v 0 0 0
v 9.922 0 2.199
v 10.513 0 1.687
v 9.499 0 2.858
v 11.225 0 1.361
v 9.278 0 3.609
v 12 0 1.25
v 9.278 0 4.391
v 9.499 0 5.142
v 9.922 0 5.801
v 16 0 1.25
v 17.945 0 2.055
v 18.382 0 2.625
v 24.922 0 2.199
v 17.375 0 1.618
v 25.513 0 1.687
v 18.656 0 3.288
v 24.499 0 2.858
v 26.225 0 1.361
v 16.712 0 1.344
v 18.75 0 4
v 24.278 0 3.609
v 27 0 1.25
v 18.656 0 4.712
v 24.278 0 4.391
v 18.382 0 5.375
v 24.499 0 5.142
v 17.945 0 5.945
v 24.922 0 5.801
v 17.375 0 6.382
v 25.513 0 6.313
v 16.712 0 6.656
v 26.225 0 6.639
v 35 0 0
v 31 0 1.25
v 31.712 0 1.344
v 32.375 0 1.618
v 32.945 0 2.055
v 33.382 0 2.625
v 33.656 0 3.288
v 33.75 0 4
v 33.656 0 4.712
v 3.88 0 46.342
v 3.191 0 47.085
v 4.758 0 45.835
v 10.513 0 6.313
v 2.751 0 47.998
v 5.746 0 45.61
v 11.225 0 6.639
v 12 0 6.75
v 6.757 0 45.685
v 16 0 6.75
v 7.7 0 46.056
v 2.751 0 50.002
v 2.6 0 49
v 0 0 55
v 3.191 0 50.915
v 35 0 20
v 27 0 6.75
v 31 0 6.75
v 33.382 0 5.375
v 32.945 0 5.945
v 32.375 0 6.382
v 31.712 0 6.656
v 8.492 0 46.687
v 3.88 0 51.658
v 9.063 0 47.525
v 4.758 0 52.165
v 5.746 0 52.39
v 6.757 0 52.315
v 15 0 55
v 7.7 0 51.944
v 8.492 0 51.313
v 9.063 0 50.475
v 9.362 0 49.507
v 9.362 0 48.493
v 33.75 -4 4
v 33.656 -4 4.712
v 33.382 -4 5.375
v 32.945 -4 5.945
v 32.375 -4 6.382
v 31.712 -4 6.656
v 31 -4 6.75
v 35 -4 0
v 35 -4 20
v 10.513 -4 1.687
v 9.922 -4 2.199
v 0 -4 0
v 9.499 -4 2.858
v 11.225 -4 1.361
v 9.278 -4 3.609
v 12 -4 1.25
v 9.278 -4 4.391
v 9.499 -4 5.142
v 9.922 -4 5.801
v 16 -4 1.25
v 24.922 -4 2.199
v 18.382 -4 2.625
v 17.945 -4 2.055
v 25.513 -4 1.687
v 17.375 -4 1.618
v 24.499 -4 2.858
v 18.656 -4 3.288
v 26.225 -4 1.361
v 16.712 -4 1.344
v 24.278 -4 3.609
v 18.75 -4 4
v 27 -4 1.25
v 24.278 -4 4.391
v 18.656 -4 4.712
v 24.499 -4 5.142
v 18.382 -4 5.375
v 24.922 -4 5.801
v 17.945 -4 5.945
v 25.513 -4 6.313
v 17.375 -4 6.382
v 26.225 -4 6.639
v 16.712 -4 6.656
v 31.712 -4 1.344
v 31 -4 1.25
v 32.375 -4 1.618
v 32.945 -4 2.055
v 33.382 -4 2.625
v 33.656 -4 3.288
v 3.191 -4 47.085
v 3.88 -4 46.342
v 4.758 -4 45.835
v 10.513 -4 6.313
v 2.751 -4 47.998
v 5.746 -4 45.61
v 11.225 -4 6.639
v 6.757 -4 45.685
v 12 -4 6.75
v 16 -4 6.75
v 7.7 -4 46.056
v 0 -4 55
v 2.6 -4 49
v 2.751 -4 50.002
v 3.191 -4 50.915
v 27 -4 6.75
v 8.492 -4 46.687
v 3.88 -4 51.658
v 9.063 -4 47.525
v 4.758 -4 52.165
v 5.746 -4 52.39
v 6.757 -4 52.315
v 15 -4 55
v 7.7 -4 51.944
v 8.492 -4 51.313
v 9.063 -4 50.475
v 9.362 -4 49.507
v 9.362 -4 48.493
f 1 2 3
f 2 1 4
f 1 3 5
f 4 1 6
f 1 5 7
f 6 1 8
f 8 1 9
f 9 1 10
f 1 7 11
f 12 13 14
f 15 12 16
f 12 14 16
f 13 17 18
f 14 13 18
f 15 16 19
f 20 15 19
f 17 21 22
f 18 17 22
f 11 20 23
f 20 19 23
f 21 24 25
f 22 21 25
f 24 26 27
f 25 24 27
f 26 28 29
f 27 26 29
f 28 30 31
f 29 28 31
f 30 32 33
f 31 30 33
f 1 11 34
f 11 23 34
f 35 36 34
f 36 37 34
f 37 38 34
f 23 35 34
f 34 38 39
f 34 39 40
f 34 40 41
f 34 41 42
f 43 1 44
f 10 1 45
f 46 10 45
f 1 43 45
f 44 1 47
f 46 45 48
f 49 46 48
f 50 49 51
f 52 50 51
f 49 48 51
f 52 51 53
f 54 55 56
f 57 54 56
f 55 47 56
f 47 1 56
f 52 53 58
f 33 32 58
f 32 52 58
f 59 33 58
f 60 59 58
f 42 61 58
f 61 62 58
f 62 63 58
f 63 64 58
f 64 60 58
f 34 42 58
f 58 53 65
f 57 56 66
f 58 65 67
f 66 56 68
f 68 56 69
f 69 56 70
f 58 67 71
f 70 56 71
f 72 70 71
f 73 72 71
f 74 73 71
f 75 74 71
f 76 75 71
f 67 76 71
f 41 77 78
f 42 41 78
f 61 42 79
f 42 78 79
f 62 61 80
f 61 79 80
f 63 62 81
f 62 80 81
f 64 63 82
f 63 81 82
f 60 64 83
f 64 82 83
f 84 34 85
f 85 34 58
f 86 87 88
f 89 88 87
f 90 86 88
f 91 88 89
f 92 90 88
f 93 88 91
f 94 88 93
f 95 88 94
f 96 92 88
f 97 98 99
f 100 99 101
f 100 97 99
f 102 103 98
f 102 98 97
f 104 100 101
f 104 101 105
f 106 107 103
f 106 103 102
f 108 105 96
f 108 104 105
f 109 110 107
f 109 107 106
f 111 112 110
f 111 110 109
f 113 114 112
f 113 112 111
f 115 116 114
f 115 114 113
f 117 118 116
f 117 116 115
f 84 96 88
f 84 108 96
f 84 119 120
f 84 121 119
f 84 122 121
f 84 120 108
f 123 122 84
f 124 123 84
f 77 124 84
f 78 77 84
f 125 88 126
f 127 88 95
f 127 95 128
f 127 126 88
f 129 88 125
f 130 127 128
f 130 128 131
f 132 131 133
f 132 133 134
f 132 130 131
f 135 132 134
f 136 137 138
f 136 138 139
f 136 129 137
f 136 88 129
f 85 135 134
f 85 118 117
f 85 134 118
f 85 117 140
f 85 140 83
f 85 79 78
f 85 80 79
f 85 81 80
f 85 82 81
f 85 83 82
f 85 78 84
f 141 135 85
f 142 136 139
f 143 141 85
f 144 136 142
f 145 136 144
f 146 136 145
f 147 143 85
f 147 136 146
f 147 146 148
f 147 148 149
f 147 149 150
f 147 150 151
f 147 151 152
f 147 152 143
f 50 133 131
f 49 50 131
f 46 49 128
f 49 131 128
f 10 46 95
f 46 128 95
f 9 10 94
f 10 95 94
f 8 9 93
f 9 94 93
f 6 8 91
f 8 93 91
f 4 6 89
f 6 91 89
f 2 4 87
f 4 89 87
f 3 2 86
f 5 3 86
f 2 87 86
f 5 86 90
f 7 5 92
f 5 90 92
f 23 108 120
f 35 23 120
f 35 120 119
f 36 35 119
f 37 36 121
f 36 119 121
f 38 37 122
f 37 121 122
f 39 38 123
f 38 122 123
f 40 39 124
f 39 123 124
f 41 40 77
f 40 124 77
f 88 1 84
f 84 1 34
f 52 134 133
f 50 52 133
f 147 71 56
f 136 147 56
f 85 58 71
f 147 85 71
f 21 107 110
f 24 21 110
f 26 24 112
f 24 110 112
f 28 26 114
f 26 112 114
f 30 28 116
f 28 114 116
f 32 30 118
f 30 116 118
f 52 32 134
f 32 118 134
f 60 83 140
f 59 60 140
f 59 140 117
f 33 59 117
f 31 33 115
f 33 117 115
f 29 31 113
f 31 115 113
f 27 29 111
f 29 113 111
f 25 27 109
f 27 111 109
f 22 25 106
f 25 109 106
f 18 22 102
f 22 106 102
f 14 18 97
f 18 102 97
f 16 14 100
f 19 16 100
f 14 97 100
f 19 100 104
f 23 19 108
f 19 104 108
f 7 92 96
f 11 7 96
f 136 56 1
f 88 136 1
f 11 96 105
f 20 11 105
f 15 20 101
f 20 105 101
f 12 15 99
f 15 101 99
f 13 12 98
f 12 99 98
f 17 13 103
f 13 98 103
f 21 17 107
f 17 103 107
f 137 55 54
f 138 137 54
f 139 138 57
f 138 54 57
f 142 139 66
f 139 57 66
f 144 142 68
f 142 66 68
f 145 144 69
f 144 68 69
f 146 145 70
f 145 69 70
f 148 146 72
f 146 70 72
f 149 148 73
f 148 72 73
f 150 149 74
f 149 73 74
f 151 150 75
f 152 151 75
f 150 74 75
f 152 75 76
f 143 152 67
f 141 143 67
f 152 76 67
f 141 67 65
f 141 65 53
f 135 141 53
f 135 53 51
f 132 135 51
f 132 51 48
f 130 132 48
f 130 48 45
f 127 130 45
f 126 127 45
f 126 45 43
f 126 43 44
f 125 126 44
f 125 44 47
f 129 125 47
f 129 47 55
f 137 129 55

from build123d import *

# Parameters (mm, degrees)
F1_DEPTH = 4
F3_DEPTH = 25
F4_D     = 6.8
F4_DEPTH = 15.35
F4_TIP   = 2.0429261047


with BuildPart() as f1:
    # F0 (on Front) → F1 (new body)
    with BuildSketch(Plane.XZ):
        Polygon((0, 55), (0, 0), (35, 0), (35, 20), (15, 55), align=None)
    extrude(amount=F1_DEPTH)

    # F2 (on face) → F3 (cut)
    with BuildSketch(Plane.XZ.offset(4)):
        with BuildLine():
            ThreePointArc((31, 1.25), (32.9445436483, 2.0554563517), (33.75, 4))
            ThreePointArc((33.75, 4), (32.9445436483, 5.9445436483), (31, 6.75))
            ThreePointArc((31, 6.75), (29.910966294, 6.5251743677), (29, 5.8874586088))
            ThreePointArc((29, 5.8874586088), (29.5556310375, 5.0155048006), (29.75, 4))
            ThreePointArc((29.75, 4), (29.5556310375, 2.9844951994), (29, 2.1125413912))
            ThreePointArc((29, 2.1125413912), (29.910966294, 1.4748256323), (31, 1.25))
        make_face()
        with BuildLine():
            ThreePointArc((29, 5.8874586088), (29.910966294, 6.5251743677), (31, 6.75))
            Line((31, 6.75), (27, 6.75))
            ThreePointArc((27, 6.75), (28.089033706, 6.5251743677), (29, 5.8874586088))
        make_face()
        with BuildLine():
            Line((27, 1.25), (31, 1.25))
            ThreePointArc((31, 1.25), (29.910966294, 1.4748256323), (29, 2.1125413912))
            ThreePointArc((29, 2.1125413912), (28.089033706, 1.4748256323), (27, 1.25))
        make_face()
        with BuildLine():
            ThreePointArc((29, 2.1125413912), (28.25, 4), (29, 5.8874586088))
            ThreePointArc((29, 5.8874586088), (28.089033706, 6.5251743677), (27, 6.75))
            ThreePointArc((27, 6.75), (24.25, 4), (27, 1.25))
            ThreePointArc((27, 1.25), (28.089033706, 1.4748256323), (29, 2.1125413912))
        make_face()
        with BuildLine():
            ThreePointArc((16, 1.25), (17.9445436483, 2.0554563517), (18.75, 4))
            ThreePointArc((18.75, 4), (17.9445436483, 5.9445436483), (16, 6.75))
            ThreePointArc((16, 6.75), (14.910966294, 6.5251743677), (14, 5.8874586088))
            ThreePointArc((14, 5.8874586088), (14.5556310375, 5.0155048006), (14.75, 4))
            ThreePointArc((14.75, 4), (14.5556310375, 2.9844951994), (14, 2.1125413912))
            ThreePointArc((14, 2.1125413912), (14.910966294, 1.4748256323), (16, 1.25))
        make_face()
        with BuildLine():
            ThreePointArc((14, 5.8874586088), (14.910966294, 6.5251743677), (16, 6.75))
            Line((16, 6.75), (12, 6.75))
            ThreePointArc((12, 6.75), (13.089033706, 6.5251743677), (14, 5.8874586088))
        make_face()
        with BuildLine():
            Line((12, 1.25), (16, 1.25))
            ThreePointArc((16, 1.25), (14.910966294, 1.4748256323), (14, 2.1125413912))
            ThreePointArc((14, 2.1125413912), (13.089033706, 1.4748256323), (12, 1.25))
        make_face()
        with BuildLine():
            ThreePointArc((14, 2.1125413912), (13.25, 4), (14, 5.8874586088))
            ThreePointArc((14, 5.8874586088), (13.089033706, 6.5251743677), (12, 6.75))
            ThreePointArc((12, 6.75), (9.25, 4), (12, 1.25))
            ThreePointArc((12, 1.25), (13.089033706, 1.4748256323), (14, 2.1125413912))
        make_face()
        with BuildLine():
            ThreePointArc((14.75, 4), (14.5556310375, 5.0155048006), (14, 5.8874586088))
            ThreePointArc((14, 5.8874586088), (13.25, 4), (14, 2.1125413912))
            ThreePointArc((14, 2.1125413912), (14.5556310375, 2.9844951994), (14.75, 4))
        make_face()
        with BuildLine():
            ThreePointArc((29.75, 4), (29.5556310375, 5.0155048006), (29, 5.8874586088))
            ThreePointArc((29, 5.8874586088), (28.25, 4), (29, 2.1125413912))
            ThreePointArc((29, 2.1125413912), (29.5556310375, 2.9844951994), (29.75, 4))
        make_face()
    extrude(amount=-F3_DEPTH, mode=Mode.SUBTRACT)

    # F4
    with Locations(Plane.XZ.offset(4)):
        with Locations((6, 49)):
            Hole(F4_D / 2, depth=F4_DEPTH)
            with Locations((0, 0, -(F4_DEPTH + F4_TIP / 2))):  # 118° drill point
                Cone(0, F4_D / 2, F4_TIP, mode=Mode.SUBTRACT)


solid = f1.part
